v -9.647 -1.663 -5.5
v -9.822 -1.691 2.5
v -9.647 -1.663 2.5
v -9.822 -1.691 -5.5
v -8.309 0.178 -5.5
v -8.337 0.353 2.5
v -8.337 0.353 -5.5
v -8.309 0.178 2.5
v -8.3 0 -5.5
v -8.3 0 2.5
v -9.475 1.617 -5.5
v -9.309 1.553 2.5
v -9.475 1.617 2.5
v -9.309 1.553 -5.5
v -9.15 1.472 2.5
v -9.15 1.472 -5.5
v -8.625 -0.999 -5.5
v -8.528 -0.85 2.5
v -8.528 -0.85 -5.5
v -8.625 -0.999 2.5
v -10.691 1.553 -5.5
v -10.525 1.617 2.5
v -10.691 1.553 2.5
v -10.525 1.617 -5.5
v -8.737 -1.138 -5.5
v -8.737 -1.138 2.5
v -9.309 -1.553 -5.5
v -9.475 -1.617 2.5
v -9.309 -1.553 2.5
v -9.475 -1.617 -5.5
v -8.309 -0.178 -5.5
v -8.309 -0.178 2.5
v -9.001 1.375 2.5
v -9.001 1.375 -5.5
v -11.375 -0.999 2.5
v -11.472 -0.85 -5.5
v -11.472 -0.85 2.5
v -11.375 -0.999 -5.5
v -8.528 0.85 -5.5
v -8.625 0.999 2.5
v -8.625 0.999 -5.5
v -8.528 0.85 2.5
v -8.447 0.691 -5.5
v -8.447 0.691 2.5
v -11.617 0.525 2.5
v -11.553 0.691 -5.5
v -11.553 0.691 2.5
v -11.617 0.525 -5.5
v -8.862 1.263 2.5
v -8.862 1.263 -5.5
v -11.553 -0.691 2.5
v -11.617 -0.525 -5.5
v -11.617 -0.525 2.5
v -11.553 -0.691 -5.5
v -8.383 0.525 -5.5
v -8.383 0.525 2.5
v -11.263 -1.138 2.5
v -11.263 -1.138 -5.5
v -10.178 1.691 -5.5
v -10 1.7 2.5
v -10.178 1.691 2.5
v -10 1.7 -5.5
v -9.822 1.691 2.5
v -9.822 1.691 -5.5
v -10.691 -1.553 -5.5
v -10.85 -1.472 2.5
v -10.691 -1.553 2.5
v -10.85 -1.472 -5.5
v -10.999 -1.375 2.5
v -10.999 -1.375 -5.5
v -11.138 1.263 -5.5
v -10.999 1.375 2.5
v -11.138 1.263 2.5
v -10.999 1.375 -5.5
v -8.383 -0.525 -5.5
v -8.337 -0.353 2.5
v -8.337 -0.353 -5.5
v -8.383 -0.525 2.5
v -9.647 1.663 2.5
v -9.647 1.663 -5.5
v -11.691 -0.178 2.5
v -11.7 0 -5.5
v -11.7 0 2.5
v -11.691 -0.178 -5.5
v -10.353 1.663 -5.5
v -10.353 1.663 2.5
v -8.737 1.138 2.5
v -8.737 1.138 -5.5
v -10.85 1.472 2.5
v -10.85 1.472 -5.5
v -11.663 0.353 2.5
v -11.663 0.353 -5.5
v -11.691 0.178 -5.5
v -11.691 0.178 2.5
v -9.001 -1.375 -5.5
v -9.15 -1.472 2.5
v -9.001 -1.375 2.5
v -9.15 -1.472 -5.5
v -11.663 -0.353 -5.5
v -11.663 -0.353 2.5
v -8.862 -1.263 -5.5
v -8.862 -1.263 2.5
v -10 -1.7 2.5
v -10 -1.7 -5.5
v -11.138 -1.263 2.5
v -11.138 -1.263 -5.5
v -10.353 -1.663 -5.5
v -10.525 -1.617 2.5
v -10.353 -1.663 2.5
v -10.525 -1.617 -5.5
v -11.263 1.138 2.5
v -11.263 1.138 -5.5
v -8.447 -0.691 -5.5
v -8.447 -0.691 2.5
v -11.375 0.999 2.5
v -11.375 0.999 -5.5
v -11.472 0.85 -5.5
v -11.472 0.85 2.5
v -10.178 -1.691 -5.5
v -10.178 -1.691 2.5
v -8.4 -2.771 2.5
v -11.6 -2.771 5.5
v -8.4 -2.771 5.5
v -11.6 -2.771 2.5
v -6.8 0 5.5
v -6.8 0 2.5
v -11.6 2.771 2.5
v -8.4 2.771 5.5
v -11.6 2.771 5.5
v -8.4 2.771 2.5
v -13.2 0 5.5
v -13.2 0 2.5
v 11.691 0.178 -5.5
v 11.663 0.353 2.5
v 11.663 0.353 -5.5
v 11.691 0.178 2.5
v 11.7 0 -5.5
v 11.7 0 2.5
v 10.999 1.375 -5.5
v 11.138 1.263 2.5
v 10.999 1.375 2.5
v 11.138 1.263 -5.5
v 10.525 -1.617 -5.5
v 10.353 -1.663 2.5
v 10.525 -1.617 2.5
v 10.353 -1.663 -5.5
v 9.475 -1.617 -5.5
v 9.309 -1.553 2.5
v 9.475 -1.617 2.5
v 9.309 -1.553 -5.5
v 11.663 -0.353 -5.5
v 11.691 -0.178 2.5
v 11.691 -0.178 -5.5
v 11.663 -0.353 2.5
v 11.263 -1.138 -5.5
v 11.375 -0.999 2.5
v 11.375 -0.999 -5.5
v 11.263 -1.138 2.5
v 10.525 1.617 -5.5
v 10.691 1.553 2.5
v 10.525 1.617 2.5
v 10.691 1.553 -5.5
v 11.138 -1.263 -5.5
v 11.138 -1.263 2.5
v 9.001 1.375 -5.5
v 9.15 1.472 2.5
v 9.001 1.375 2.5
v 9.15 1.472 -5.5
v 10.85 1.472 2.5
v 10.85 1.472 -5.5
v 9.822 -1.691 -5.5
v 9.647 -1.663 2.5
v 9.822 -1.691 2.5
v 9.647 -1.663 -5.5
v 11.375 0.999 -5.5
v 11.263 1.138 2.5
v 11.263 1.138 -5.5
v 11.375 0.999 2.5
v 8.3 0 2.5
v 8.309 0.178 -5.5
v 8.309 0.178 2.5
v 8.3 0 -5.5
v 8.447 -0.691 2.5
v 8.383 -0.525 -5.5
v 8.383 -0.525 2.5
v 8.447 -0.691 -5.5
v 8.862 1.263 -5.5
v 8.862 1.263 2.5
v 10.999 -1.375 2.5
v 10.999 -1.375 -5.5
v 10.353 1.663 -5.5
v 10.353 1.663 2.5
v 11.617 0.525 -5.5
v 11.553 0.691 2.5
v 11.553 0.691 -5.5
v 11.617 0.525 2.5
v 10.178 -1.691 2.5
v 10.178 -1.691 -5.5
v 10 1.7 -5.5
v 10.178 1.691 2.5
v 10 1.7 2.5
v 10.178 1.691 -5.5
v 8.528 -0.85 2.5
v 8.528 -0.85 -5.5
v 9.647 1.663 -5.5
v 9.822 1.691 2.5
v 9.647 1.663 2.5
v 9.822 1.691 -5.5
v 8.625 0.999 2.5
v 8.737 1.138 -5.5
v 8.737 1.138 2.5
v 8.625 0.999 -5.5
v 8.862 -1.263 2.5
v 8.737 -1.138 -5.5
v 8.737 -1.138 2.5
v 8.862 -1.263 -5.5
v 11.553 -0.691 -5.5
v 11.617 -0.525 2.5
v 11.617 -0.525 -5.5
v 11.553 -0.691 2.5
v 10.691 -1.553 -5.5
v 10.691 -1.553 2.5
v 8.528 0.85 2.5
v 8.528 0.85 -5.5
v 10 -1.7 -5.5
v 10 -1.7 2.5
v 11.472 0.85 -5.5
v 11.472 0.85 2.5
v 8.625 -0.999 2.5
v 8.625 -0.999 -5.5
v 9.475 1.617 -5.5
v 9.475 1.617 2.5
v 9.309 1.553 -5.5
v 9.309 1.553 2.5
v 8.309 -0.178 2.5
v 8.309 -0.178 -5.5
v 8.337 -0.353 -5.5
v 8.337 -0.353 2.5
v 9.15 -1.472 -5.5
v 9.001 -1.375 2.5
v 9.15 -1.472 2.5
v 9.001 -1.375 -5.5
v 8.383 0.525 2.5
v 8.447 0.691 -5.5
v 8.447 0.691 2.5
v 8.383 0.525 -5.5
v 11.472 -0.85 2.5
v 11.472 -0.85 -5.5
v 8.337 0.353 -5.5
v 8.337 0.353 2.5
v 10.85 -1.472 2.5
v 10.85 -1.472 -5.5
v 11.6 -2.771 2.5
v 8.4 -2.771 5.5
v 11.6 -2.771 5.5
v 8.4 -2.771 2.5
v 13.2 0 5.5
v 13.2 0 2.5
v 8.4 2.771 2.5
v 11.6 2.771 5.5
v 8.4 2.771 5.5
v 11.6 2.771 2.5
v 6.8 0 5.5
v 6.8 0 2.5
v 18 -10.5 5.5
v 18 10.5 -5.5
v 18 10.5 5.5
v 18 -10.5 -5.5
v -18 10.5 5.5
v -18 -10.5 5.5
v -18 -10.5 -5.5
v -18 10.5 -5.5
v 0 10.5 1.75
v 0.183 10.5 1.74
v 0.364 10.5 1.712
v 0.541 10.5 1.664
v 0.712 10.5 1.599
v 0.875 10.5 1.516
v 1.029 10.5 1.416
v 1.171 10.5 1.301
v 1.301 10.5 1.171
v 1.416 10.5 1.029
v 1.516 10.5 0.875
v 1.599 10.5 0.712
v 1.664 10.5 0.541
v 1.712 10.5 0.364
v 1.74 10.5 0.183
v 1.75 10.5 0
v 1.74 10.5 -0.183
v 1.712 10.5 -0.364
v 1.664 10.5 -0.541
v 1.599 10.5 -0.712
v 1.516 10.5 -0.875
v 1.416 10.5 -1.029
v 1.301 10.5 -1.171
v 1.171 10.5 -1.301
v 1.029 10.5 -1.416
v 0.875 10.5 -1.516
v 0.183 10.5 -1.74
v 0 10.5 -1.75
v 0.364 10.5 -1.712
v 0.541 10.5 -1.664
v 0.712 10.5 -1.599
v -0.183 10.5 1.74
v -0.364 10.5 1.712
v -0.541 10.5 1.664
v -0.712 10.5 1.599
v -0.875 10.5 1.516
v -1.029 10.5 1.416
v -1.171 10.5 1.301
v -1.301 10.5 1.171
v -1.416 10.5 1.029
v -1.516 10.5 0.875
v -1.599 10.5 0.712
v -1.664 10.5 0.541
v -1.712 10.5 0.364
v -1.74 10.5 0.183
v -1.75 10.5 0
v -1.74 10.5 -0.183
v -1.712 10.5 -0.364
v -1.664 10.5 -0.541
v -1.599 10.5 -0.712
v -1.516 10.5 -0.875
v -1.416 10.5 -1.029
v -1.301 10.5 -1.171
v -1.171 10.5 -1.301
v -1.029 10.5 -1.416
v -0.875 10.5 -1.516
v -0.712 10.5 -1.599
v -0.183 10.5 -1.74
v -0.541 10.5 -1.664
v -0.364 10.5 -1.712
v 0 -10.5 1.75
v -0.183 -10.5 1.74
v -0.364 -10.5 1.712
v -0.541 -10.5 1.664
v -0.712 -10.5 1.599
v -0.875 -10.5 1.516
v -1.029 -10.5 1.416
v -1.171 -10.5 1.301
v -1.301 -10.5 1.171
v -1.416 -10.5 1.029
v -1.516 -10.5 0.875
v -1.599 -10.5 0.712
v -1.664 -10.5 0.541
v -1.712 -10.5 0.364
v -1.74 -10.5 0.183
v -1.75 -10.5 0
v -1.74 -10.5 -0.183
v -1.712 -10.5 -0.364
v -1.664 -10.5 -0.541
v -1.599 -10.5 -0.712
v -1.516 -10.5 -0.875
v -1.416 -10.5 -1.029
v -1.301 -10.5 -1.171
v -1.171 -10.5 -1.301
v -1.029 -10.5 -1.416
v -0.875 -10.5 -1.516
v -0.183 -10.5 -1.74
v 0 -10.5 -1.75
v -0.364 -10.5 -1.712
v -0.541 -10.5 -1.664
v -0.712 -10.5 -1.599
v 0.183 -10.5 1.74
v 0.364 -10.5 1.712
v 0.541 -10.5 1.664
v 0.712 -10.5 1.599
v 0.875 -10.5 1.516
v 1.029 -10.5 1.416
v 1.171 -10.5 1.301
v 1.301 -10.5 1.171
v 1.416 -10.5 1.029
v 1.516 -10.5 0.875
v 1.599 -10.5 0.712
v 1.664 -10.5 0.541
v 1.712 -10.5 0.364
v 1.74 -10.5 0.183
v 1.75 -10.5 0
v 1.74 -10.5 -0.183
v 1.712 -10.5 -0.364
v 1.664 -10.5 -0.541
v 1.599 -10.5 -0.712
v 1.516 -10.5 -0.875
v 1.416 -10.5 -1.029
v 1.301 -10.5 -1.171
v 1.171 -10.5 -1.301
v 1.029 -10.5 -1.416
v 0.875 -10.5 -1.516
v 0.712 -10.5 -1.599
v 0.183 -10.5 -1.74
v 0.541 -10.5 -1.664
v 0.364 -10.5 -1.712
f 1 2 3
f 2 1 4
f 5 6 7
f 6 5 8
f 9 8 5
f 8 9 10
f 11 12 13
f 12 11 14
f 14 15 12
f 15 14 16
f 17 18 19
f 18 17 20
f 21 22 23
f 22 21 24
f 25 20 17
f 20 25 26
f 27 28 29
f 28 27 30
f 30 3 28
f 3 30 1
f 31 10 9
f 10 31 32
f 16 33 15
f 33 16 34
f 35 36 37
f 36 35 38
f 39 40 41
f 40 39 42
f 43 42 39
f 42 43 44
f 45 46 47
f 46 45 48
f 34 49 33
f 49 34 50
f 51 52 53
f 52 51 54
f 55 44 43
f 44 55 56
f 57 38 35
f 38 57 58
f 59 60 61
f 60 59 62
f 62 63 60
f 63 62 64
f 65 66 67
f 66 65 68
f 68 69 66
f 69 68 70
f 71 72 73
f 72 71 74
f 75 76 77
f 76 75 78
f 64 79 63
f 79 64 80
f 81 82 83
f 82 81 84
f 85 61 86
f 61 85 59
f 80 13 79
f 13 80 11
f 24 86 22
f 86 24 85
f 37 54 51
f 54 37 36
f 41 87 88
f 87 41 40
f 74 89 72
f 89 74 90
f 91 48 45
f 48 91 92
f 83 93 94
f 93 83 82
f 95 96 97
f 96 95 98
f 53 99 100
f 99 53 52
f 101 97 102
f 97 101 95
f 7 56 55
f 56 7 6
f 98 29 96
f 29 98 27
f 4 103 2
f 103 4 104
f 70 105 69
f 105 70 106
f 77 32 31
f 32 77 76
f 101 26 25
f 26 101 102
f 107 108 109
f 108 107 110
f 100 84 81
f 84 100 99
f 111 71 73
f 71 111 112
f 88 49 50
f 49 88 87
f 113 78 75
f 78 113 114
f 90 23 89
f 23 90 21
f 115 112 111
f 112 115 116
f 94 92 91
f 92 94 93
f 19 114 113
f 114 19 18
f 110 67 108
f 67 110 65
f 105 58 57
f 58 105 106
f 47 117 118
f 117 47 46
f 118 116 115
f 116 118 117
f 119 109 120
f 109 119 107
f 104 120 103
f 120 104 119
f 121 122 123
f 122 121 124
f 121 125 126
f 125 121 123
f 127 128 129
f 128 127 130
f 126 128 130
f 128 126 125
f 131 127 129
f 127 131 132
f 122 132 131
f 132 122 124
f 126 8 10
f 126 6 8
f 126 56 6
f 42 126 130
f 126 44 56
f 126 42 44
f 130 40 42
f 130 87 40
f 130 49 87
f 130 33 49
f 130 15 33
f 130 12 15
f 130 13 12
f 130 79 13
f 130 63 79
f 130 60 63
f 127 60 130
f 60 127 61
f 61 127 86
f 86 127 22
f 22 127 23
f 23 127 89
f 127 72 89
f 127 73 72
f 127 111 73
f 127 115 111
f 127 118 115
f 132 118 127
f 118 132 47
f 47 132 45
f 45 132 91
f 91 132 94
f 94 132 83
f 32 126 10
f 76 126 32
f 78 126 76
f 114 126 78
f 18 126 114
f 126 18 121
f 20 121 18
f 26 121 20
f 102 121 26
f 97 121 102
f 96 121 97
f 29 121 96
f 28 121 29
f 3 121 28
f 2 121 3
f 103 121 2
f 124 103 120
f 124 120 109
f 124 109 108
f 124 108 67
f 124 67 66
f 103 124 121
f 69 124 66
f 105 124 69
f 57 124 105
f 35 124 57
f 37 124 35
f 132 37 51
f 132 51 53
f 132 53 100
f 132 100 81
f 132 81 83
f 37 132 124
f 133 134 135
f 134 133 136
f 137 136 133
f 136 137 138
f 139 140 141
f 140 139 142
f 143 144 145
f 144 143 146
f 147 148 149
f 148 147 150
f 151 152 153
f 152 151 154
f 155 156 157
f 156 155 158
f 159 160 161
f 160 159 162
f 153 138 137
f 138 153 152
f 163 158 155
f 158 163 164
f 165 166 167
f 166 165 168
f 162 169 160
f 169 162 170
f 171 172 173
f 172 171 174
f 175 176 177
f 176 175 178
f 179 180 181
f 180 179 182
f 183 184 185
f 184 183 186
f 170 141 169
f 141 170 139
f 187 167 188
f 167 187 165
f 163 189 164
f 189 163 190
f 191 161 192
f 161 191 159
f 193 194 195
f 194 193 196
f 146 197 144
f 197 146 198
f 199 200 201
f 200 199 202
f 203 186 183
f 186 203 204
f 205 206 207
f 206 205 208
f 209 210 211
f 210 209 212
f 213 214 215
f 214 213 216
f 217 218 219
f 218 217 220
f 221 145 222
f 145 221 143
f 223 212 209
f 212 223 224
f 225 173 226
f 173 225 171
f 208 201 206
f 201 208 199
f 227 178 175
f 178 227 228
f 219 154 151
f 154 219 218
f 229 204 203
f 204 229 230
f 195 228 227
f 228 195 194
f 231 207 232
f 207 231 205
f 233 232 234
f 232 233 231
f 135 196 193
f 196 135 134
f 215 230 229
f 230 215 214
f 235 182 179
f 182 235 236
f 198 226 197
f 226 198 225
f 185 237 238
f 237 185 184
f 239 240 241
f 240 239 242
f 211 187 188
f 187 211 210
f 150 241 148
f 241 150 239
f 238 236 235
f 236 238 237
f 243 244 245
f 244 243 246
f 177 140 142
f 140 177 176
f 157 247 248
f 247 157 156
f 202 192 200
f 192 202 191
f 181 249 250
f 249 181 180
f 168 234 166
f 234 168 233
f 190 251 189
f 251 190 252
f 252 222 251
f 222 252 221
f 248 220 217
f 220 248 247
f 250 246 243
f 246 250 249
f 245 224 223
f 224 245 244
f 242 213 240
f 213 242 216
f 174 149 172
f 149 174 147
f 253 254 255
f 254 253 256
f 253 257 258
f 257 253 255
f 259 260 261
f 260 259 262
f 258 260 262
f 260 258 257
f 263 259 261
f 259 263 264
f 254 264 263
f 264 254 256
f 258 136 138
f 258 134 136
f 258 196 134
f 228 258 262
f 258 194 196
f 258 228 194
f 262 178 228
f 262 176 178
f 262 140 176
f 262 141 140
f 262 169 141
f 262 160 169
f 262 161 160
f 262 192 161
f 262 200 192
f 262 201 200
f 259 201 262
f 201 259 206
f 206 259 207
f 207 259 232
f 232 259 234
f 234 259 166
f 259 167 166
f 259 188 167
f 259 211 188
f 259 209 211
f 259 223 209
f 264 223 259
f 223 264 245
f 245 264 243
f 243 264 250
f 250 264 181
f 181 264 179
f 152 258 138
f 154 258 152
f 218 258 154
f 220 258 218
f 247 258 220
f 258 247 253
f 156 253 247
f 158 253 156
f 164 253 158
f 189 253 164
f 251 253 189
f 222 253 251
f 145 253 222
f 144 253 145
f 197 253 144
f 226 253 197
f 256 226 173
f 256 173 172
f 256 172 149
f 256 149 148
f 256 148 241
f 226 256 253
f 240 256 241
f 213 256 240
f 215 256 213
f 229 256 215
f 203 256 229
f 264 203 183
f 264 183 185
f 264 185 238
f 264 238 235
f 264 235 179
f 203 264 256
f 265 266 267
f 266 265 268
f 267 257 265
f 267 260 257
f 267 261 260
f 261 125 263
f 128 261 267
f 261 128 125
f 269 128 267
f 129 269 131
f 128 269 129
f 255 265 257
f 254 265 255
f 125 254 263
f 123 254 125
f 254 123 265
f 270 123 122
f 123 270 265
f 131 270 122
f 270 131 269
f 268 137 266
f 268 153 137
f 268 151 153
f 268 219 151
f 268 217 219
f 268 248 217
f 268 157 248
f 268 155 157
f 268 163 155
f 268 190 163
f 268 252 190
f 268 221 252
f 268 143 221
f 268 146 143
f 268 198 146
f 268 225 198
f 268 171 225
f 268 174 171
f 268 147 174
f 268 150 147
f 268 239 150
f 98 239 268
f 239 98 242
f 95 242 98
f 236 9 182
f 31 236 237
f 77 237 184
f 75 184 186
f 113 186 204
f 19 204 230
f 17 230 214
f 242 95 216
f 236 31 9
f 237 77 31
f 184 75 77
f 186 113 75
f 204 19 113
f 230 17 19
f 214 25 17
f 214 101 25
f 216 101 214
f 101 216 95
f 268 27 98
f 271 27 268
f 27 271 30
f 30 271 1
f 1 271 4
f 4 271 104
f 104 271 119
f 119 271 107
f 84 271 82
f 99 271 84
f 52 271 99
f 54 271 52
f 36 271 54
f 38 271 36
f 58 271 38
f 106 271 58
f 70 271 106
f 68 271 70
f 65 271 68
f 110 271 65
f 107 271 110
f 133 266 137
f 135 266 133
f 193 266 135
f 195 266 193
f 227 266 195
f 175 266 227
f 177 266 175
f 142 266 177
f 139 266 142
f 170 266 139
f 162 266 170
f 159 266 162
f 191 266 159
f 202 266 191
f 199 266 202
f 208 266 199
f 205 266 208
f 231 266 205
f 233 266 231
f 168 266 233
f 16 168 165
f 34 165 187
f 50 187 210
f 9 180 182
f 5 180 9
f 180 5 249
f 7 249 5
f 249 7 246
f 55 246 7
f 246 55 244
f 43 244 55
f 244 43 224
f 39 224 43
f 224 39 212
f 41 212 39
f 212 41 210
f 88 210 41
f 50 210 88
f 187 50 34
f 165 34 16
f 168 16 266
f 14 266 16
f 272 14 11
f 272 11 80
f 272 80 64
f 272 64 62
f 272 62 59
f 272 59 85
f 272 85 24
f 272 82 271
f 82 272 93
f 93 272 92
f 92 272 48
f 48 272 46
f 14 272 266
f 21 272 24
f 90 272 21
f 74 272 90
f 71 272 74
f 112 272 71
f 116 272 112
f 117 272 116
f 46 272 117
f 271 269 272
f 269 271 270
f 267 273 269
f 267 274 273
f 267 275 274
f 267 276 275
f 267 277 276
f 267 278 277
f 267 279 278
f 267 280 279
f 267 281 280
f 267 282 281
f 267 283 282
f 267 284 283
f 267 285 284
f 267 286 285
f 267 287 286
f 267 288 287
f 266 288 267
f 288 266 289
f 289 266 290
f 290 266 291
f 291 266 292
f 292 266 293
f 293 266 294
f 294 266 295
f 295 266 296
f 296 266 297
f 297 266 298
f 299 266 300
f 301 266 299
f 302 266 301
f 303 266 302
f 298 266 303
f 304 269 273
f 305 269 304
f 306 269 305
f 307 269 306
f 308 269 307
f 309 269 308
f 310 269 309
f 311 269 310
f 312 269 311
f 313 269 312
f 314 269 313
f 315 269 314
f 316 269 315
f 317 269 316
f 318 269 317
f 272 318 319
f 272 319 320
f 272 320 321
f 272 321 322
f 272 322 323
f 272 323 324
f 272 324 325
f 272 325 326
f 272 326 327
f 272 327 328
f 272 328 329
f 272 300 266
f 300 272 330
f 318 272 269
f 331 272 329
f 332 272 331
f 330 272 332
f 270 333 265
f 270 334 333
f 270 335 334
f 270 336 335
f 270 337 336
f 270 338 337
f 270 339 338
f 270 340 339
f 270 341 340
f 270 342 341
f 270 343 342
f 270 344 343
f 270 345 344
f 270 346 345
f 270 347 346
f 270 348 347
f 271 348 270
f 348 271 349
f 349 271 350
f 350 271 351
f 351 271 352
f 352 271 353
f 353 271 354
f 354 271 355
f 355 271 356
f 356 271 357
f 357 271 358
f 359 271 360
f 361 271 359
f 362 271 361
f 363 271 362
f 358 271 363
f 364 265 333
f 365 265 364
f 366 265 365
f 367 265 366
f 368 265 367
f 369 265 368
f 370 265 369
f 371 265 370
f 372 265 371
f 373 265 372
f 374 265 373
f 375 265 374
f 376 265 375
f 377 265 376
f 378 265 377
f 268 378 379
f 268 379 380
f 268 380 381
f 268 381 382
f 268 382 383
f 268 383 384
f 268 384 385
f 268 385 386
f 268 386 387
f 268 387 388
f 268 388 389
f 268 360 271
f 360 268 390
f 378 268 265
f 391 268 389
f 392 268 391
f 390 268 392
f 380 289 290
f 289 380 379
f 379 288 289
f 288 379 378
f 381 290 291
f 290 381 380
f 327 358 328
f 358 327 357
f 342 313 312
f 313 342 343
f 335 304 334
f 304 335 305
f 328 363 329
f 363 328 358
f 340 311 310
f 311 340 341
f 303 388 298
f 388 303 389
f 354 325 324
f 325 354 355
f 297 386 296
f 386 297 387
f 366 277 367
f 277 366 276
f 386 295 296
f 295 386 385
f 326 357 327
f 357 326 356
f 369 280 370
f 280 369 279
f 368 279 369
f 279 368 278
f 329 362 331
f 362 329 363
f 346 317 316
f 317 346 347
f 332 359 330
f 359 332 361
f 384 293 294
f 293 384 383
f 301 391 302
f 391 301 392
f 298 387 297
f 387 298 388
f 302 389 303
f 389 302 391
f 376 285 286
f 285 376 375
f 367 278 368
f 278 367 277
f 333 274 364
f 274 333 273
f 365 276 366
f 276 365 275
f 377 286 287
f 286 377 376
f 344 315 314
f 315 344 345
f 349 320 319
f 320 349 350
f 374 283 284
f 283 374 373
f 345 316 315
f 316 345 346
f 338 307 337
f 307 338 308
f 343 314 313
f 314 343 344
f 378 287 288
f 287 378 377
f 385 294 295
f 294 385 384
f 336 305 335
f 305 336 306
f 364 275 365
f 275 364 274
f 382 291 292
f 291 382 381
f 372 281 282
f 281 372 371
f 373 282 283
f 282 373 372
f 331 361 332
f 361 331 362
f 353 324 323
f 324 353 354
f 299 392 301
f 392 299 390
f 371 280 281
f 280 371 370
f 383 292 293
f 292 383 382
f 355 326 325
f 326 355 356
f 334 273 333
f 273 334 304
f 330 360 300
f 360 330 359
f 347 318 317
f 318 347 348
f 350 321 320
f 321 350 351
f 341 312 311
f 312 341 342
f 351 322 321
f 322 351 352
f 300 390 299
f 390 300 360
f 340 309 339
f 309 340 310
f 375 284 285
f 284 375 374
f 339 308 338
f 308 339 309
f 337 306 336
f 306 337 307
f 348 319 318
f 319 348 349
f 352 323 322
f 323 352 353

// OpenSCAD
// Cable strain-relief clamp for 3 mm bundle.
$fn = 60;
eps = 0.02;
body_l = 36;
body_w = 21;
body_h = 11;
cable_d = 3.5;
bolt_pitch = 20;
difference() {
    cube([body_l, body_w, body_h], center = true);
    translate([0, -body_w / 2 - eps, 0]) rotate([-90, 0, 0]) cylinder(d = cable_d, h = body_w + 2 * eps);
    for (x = [-bolt_pitch / 2, bolt_pitch / 2]) {
        translate([x, 0, -body_h / 2 - eps]) cylinder(d = 3.4, h = body_h + 2 * eps);
        translate([x, 0, body_h / 2 - 3]) cylinder(d = 6.4, h = 3 + eps, $fn = 6);
    }
}
